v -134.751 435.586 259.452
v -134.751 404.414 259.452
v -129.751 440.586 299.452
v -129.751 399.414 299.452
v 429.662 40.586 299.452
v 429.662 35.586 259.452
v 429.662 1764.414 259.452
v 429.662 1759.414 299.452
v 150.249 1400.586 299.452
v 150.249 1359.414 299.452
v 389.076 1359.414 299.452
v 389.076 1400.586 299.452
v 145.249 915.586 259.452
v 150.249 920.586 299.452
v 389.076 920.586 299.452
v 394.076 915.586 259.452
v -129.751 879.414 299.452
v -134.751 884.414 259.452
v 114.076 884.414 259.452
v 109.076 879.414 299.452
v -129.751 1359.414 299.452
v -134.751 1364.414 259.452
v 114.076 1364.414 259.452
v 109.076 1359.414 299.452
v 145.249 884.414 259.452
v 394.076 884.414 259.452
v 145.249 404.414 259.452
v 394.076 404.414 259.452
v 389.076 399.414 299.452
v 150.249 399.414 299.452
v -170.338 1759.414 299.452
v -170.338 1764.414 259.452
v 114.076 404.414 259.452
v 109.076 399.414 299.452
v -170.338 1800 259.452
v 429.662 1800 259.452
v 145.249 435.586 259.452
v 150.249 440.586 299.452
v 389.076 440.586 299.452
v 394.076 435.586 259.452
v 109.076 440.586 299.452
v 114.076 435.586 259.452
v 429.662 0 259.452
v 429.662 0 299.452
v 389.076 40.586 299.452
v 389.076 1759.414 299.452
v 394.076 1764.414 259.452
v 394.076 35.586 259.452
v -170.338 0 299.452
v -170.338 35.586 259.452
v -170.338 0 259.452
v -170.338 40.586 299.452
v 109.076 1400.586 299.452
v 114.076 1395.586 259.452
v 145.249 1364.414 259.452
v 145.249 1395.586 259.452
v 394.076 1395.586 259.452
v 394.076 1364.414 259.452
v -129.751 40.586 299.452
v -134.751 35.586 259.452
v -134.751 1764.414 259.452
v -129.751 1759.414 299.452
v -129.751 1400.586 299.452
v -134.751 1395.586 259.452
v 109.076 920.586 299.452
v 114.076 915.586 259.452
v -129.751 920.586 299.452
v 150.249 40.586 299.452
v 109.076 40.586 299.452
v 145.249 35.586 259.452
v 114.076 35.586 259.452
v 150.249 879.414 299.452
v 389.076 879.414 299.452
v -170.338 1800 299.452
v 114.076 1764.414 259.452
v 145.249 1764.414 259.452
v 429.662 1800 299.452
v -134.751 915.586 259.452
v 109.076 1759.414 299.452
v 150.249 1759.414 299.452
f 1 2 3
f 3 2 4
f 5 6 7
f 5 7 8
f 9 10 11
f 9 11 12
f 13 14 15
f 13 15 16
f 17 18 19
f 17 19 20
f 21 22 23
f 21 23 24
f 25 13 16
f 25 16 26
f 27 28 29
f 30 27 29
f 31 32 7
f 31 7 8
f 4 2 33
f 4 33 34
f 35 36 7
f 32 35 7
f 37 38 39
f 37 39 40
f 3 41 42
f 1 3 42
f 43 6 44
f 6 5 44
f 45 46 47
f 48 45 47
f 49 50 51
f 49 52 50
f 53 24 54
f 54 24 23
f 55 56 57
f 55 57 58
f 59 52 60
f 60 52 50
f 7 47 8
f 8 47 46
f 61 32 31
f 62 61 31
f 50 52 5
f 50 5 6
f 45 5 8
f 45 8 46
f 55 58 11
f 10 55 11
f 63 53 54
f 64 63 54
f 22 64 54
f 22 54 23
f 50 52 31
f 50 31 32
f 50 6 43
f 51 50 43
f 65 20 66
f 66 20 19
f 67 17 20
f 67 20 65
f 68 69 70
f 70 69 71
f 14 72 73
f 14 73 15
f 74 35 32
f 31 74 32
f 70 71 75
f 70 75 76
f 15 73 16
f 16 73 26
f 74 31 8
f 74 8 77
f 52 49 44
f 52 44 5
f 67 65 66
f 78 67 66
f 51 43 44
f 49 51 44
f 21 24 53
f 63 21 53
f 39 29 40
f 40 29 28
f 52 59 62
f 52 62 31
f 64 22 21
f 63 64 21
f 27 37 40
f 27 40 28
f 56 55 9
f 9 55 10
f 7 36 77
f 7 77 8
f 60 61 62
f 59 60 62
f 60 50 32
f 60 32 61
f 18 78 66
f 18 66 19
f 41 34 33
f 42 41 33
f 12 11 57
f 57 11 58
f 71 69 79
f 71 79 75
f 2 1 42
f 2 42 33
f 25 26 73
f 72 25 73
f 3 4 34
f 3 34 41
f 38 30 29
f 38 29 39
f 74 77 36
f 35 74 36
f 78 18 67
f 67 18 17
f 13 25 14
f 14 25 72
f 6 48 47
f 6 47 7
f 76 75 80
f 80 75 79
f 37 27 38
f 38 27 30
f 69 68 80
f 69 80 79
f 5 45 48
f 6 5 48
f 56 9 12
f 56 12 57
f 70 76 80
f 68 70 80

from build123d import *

# Parameters (mm, degrees)
F1_DEPTH  = 1800
F3_DEPTH  = 800
F4_DEPTH  = 600
F5_DEPTH  = 600
F6_DEPTH  = 800
F7_DEPTH  = 600
F8_DEPTH  = 1900
F9_DEPTH  = 1900
F10_DEPTH = 1900
F11_DEPTH = 800
F12_DEPTH = 1800
F13_DEPTH = 600


with BuildPart() as f1:
    # F0 (on Front) → F1 (new body)
    with BuildSketch(Plane.XZ):
        Polygon((-134.7514528915, 259.4524627924), (-170.3375428915, 259.4524627924), (-170.3375428915, 254.4524627924), (-130.3375428915, 254.4524627924), (-125.3375428915, 294.4524627924), (104.6624571085, 294.4524627924), (109.6624571085, 254.4524627924), (129.6624571085, 254.4524627924), (129.6624571085, 259.4524627924), (114.0763682012, 259.4524627924), (109.0763682012, 299.4524627924), (-129.7514517988, 299.4524627924), align=None)
        Polygon((-170.3375428915, 299.4524627924), (-170.3375428915, 259.4524627924), (-134.7514528915, 259.4524627924), (-129.7514517988, 299.4524627924), align=None)
        Polygon((150.2485460158, 299.4524627924), (109.0763682012, 299.4524627924), (114.0763682012, 259.4524627924), (129.6624571085, 259.4524627924), (145.2485460158, 259.4524627924), align=None)
        Polygon((389.0763660158, 299.4524627924), (150.2485460158, 299.4524627924), (145.2485460158, 259.4524627924), (129.6624571085, 259.4524627924), (129.6624571085, 254.4524627924), (149.6624571085, 254.4524627924), (154.6624571085, 294.4524627924), (384.6624571085, 294.4524627924), (389.6624571085, 254.4524627924), (429.6624571085, 254.4524627924), (429.6624571085, 259.4524627924), (394.0763671085, 259.4524627924), align=None)
        Polygon((429.6624571085, 299.4524627924), (389.0763660158, 299.4524627924), (394.0763671085, 259.4524627924), (429.6624571085, 259.4524627924), align=None)
    extrude(amount=-F1_DEPTH)

    # F2 (on face) → F3 (cut)
    with BuildSketch(Plane(origin=(-170.3375428915, 0, 0), x_dir=(0, -1, 0), z_dir=(-1, 0, 0))):
        Polygon((-1800, 254.4524627924), (-1760, 254.4524627924), (-1759.375, 259.4524627924), (-1755, 294.4524627924), (-1760.0389110927, 294.4524627924), (-1764.4139110927, 259.4524627924), (-1800, 259.4524627924), align=None)
    extrude(amount=-F3_DEPTH, mode=Mode.SUBTRACT)

    # F2 (on face) → F4 (join)
    with BuildSketch(Plane(origin=(-170.3375428915, 0, 0), x_dir=(0, -1, 0), z_dir=(-1, 0, 0))):
        Polygon((-1760.0389110927, 294.4524627924), (-1759.4139110927, 299.4524627924), (-1800, 299.4524627924), (-1800, 259.4524627924), (-1764.4139110927, 259.4524627924), align=None)
    extrude(amount=-F4_DEPTH)

    # F2 (on face) → F5 (join)
    with BuildSketch(Plane(origin=(-170.3375428915, 0, 0), x_dir=(0, -1, 0), z_dir=(-1, 0, 0))):
        Polygon((-1800, 254.4524627924), (-1760, 254.4524627924), (-1759.375, 259.4524627924), (-1755, 294.4524627924), (-1760.0389110927, 294.4524627924), (-1764.4139110927, 259.4524627924), (-1800, 259.4524627924), align=None)
    extrude(amount=-F5_DEPTH)

    # F2 (on face) → F6 (cut)
    with BuildSketch(Plane(origin=(-170.3375428915, 0, 0), x_dir=(0, -1, 0), z_dir=(-1, 0, 0))):
        Polygon((-1400, 254.4524627924), (-1360, 254.4524627924), (-1355, 294.4524627924), (-1360.0389110927, 294.4524627924), (-1364.4139110927, 259.4524627924), (-1395.5860889073, 259.4524627924), (-1399.9610889073, 294.4524627924), (-1405, 294.4524627924), (-1400.625, 259.4524627924), align=None)
        Polygon((-880.0389110927, 294.4524627924), (-879.4139110927, 299.4524627924), (-900, 299.4524627924), (-920.5860889073, 299.4524627924), (-919.9610889073, 294.4524627924), (-915.5860889073, 259.4524627924), (-900, 259.4524627924), (-884.4139110927, 259.4524627924), align=None)
        Polygon((-900, 254.4524627924), (-880, 254.4524627924), (-879.375, 259.4524627924), (-875, 294.4524627924), (-880.0389110927, 294.4524627924), (-884.4139110927, 259.4524627924), (-900, 259.4524627924), (-915.5860889073, 259.4524627924), (-919.9610889073, 294.4524627924), (-925, 294.4524627924), (-920, 254.4524627924), align=None)
        Polygon((-400.0389110927, 294.4524627924), (-399.4139110927, 299.4524627924), (-440.5860889073, 299.4524627924), (-439.9610889073, 294.4524627924), (-435.5860889073, 259.4524627924), (-404.4139110927, 259.4524627924), align=None)
        Polygon((-35.5860889073, 259.4524627924), (0, 259.4524627924), (0, 299.4524627924), (-40.5860889073, 299.4524627924), (-39.9610889073, 294.4524627924), align=None)
    extrude(amount=-F6_DEPTH, mode=Mode.SUBTRACT)

    # F2 (on face) → F7 (join)
    with BuildSketch(Plane(origin=(-170.3375428915, 0, 0), x_dir=(0, -1, 0), z_dir=(-1, 0, 0))):
        Polygon((-40, 254.4524627924), (0, 254.4524627924), (0, 259.4524627924), (-35.5860889073, 259.4524627924), (-39.9610889073, 294.4524627924), (-45, 294.4524627924), (-40.625, 259.4524627924), align=None)
        Polygon((-440, 254.4524627924), (-400, 254.4524627924), (-399.375, 259.4524627924), (-395, 294.4524627924), (-400.0389110927, 294.4524627924), (-404.4139110927, 259.4524627924), (-435.5860889073, 259.4524627924), (-439.9610889073, 294.4524627924), (-445, 294.4524627924), (-440.625, 259.4524627924), align=None)
        Polygon((-900, 254.4524627924), (-880, 254.4524627924), (-879.375, 259.4524627924), (-875, 294.4524627924), (-880.0389110927, 294.4524627924), (-884.4139110927, 259.4524627924), (-900, 259.4524627924), (-915.5860889073, 259.4524627924), (-919.9610889073, 294.4524627924), (-925, 294.4524627924), (-920, 254.4524627924), align=None)
        Polygon((-880.0389110927, 294.4524627924), (-879.4139110927, 299.4524627924), (-900, 299.4524627924), (-920.5860889073, 299.4524627924), (-919.9610889073, 294.4524627924), (-915.5860889073, 259.4524627924), (-900, 259.4524627924), (-884.4139110927, 259.4524627924), align=None)
        Polygon((-1400, 254.4524627924), (-1360, 254.4524627924), (-1355, 294.4524627924), (-1360.0389110927, 294.4524627924), (-1364.4139110927, 259.4524627924), (-1395.5860889073, 259.4524627924), (-1399.9610889073, 294.4524627924), (-1405, 294.4524627924), (-1400.625, 259.4524627924), align=None)
        Polygon((-1360.0389110927, 294.4524627924), (-1359.4139110927, 299.4524627924), (-1400.5860889073, 299.4524627924), (-1399.9610889073, 294.4524627924), (-1395.5860889073, 259.4524627924), (-1364.4139110927, 259.4524627924), align=None)
    extrude(amount=-F7_DEPTH)

    # F0 (on Front) → F8 (cut)
    with BuildSketch(Plane.XZ):
        Polygon((-170.3375428915, 299.4524627924), (-170.3375428915, 259.4524627924), (-134.7514528915, 259.4524627924), (-129.7514517988, 299.4524627924), align=None)
    extrude(amount=-F8_DEPTH, mode=Mode.SUBTRACT)

    # F0 (on Front) → F9 (cut)
    with BuildSketch(Plane.XZ):
        Polygon((150.2485460158, 299.4524627924), (109.0763682012, 299.4524627924), (114.0763682012, 259.4524627924), (129.6624571085, 259.4524627924), (145.2485460158, 259.4524627924), align=None)
    extrude(amount=-F9_DEPTH, mode=Mode.SUBTRACT)

    # F0 (on Front) → F10 (cut)
    with BuildSketch(Plane.XZ):
        Polygon((429.6624571085, 299.4524627924), (389.0763660158, 299.4524627924), (394.0763671085, 259.4524627924), (429.6624571085, 259.4524627924), align=None)
    extrude(amount=-F10_DEPTH, mode=Mode.SUBTRACT)

    # F2 (on face) → F11 (cut)
    with BuildSketch(Plane(origin=(-170.3375428915, 0, 0), x_dir=(0, -1, 0), z_dir=(-1, 0, 0))):
        Polygon((-1760.0389110927, 294.4524627924), (-1759.4139110927, 299.4524627924), (-1800, 299.4524627924), (-1800, 259.4524627924), (-1764.4139110927, 259.4524627924), align=None)
        Polygon((-1360.0389110927, 294.4524627924), (-1359.4139110927, 299.4524627924), (-1400.5860889073, 299.4524627924), (-1399.9610889073, 294.4524627924), (-1395.5860889073, 259.4524627924), (-1364.4139110927, 259.4524627924), align=None)
        Polygon((-880.0389110927, 294.4524627924), (-879.4139110927, 299.4524627924), (-900, 299.4524627924), (-920.5860889073, 299.4524627924), (-919.9610889073, 294.4524627924), (-915.5860889073, 259.4524627924), (-900, 259.4524627924), (-884.4139110927, 259.4524627924), align=None)
    extrude(amount=-F11_DEPTH, mode=Mode.SUBTRACT)


with BuildPart() as f12:
    # F0 (on Front) → F12 (new body)
    with BuildSketch(Plane.XZ):
        Polygon((-170.3375428915, 299.4524627924), (-170.3375428915, 259.4524627924), (-134.7514528915, 259.4524627924), (-129.7514517988, 299.4524627924), align=None)
    extrude(amount=-F12_DEPTH)


with BuildPart() as f12b:
    # F0 (on Front) → F12, piece 2 (new body)
    with BuildSketch(Plane.XZ):
        Polygon((150.2485460158, 299.4524627924), (109.0763682012, 299.4524627924), (114.0763682012, 259.4524627924), (129.6624571085, 259.4524627924), (145.2485460158, 259.4524627924), align=None)
    extrude(amount=-F12_DEPTH)


with BuildPart() as f12c:
    # F0 (on Front) → F12, piece 3 (new body)
    with BuildSketch(Plane.XZ):
        Polygon((429.6624571085, 299.4524627924), (389.0763660158, 299.4524627924), (394.0763671085, 259.4524627924), (429.6624571085, 259.4524627924), align=None)
    extrude(amount=-F12_DEPTH)


with BuildPart() as f13:
    # F2 (on face) → F13 (new body)
    with BuildSketch(Plane(origin=(-170.3375428915, 0, 0), x_dir=(0, -1, 0), z_dir=(-1, 0, 0))):
        Polygon((-1760.0389110927, 294.4524627924), (-1759.4139110927, 299.4524627924), (-1800, 299.4524627924), (-1800, 259.4524627924), (-1764.4139110927, 259.4524627924), align=None)
    extrude(amount=-F13_DEPTH)


with BuildPart() as f13b:
    # F2 (on face) → F13, piece 2 (new body)
    with BuildSketch(Plane(origin=(-170.3375428915, 0, 0), x_dir=(0, -1, 0), z_dir=(-1, 0, 0))):
        Polygon((-1360.0389110927, 294.4524627924), (-1359.4139110927, 299.4524627924), (-1400.5860889073, 299.4524627924), (-1399.9610889073, 294.4524627924), (-1395.5860889073, 259.4524627924), (-1364.4139110927, 259.4524627924), align=None)
    extrude(amount=-F13_DEPTH)

    # F14: cut F12c, F12b, F12
    add(f12c.part, mode=Mode.SUBTRACT)
    add(f12b.part, mode=Mode.SUBTRACT)
    add(f12.part, mode=Mode.SUBTRACT)


with BuildPart() as f13c:
    # F2 (on face) → F13, piece 3 (new body)
    with BuildSketch(Plane(origin=(-170.3375428915, 0, 0), x_dir=(0, -1, 0), z_dir=(-1, 0, 0))):
        Polygon((-880.0389110927, 294.4524627924), (-879.4139110927, 299.4524627924), (-900, 299.4524627924), (-920.5860889073, 299.4524627924), (-919.9610889073, 294.4524627924), (-915.5860889073, 259.4524627924), (-900, 259.4524627924), (-884.4139110927, 259.4524627924), align=None)
    extrude(amount=-F13_DEPTH)

    # F14: cut F12c, F12b, F12
    add(f12c.part, mode=Mode.SUBTRACT)
    add(f12b.part, mode=Mode.SUBTRACT)
    add(f12.part, mode=Mode.SUBTRACT)


with BuildPart() as f13d:
    # F2 (on face) → F13, piece 4 (new body)
    with BuildSketch(Plane(origin=(-170.3375428915, 0, 0), x_dir=(0, -1, 0), z_dir=(-1, 0, 0))):
        Polygon((-400.0389110927, 294.4524627924), (-399.4139110927, 299.4524627924), (-440.5860889073, 299.4524627924), (-439.9610889073, 294.4524627924), (-435.5860889073, 259.4524627924), (-404.4139110927, 259.4524627924), align=None)
    extrude(amount=-F13_DEPTH)

    # F14: cut F12c, F12b, F12
    add(f12c.part, mode=Mode.SUBTRACT)
    add(f12b.part, mode=Mode.SUBTRACT)
    add(f12.part, mode=Mode.SUBTRACT)


with BuildPart() as f13e:
    # F2 (on face) → F13, piece 5 (new body)
    with BuildSketch(Plane(origin=(-170.3375428915, 0, 0), x_dir=(0, -1, 0), z_dir=(-1, 0, 0))):
        Polygon((-35.5860889073, 259.4524627924), (0, 259.4524627924), (0, 299.4524627924), (-40.5860889073, 299.4524627924), (-39.9610889073, 294.4524627924), align=None)
    extrude(amount=-F13_DEPTH)


with BuildPart() as f1_1:
    add(f1.part)

    # F15: cut F13e
    add(f13e.part, mode=Mode.SUBTRACT)


with BuildPart() as f12b_1:
    add(f12b.part)

    # F15: cut F13e
    add(f13e.part, mode=Mode.SUBTRACT)

    # F16: cut F13e, F13
    add(f13e.part, mode=Mode.SUBTRACT)
    add(f13.part, mode=Mode.SUBTRACT)


with BuildPart() as f12c_1:
    add(f12c.part)

    # F16: cut F13e, F13
    add(f13e.part, mode=Mode.SUBTRACT)
    add(f13.part, mode=Mode.SUBTRACT)


with BuildPart() as f12_1:
    add(f12.part)

    # F16: cut F13e, F13
    add(f13e.part, mode=Mode.SUBTRACT)
    add(f13.part, mode=Mode.SUBTRACT)


solid = Compound([f13.part, f13b.part, f13c.part, f13d.part, f13e.part, f12b_1.part, f12c_1.part, f12_1.part])
